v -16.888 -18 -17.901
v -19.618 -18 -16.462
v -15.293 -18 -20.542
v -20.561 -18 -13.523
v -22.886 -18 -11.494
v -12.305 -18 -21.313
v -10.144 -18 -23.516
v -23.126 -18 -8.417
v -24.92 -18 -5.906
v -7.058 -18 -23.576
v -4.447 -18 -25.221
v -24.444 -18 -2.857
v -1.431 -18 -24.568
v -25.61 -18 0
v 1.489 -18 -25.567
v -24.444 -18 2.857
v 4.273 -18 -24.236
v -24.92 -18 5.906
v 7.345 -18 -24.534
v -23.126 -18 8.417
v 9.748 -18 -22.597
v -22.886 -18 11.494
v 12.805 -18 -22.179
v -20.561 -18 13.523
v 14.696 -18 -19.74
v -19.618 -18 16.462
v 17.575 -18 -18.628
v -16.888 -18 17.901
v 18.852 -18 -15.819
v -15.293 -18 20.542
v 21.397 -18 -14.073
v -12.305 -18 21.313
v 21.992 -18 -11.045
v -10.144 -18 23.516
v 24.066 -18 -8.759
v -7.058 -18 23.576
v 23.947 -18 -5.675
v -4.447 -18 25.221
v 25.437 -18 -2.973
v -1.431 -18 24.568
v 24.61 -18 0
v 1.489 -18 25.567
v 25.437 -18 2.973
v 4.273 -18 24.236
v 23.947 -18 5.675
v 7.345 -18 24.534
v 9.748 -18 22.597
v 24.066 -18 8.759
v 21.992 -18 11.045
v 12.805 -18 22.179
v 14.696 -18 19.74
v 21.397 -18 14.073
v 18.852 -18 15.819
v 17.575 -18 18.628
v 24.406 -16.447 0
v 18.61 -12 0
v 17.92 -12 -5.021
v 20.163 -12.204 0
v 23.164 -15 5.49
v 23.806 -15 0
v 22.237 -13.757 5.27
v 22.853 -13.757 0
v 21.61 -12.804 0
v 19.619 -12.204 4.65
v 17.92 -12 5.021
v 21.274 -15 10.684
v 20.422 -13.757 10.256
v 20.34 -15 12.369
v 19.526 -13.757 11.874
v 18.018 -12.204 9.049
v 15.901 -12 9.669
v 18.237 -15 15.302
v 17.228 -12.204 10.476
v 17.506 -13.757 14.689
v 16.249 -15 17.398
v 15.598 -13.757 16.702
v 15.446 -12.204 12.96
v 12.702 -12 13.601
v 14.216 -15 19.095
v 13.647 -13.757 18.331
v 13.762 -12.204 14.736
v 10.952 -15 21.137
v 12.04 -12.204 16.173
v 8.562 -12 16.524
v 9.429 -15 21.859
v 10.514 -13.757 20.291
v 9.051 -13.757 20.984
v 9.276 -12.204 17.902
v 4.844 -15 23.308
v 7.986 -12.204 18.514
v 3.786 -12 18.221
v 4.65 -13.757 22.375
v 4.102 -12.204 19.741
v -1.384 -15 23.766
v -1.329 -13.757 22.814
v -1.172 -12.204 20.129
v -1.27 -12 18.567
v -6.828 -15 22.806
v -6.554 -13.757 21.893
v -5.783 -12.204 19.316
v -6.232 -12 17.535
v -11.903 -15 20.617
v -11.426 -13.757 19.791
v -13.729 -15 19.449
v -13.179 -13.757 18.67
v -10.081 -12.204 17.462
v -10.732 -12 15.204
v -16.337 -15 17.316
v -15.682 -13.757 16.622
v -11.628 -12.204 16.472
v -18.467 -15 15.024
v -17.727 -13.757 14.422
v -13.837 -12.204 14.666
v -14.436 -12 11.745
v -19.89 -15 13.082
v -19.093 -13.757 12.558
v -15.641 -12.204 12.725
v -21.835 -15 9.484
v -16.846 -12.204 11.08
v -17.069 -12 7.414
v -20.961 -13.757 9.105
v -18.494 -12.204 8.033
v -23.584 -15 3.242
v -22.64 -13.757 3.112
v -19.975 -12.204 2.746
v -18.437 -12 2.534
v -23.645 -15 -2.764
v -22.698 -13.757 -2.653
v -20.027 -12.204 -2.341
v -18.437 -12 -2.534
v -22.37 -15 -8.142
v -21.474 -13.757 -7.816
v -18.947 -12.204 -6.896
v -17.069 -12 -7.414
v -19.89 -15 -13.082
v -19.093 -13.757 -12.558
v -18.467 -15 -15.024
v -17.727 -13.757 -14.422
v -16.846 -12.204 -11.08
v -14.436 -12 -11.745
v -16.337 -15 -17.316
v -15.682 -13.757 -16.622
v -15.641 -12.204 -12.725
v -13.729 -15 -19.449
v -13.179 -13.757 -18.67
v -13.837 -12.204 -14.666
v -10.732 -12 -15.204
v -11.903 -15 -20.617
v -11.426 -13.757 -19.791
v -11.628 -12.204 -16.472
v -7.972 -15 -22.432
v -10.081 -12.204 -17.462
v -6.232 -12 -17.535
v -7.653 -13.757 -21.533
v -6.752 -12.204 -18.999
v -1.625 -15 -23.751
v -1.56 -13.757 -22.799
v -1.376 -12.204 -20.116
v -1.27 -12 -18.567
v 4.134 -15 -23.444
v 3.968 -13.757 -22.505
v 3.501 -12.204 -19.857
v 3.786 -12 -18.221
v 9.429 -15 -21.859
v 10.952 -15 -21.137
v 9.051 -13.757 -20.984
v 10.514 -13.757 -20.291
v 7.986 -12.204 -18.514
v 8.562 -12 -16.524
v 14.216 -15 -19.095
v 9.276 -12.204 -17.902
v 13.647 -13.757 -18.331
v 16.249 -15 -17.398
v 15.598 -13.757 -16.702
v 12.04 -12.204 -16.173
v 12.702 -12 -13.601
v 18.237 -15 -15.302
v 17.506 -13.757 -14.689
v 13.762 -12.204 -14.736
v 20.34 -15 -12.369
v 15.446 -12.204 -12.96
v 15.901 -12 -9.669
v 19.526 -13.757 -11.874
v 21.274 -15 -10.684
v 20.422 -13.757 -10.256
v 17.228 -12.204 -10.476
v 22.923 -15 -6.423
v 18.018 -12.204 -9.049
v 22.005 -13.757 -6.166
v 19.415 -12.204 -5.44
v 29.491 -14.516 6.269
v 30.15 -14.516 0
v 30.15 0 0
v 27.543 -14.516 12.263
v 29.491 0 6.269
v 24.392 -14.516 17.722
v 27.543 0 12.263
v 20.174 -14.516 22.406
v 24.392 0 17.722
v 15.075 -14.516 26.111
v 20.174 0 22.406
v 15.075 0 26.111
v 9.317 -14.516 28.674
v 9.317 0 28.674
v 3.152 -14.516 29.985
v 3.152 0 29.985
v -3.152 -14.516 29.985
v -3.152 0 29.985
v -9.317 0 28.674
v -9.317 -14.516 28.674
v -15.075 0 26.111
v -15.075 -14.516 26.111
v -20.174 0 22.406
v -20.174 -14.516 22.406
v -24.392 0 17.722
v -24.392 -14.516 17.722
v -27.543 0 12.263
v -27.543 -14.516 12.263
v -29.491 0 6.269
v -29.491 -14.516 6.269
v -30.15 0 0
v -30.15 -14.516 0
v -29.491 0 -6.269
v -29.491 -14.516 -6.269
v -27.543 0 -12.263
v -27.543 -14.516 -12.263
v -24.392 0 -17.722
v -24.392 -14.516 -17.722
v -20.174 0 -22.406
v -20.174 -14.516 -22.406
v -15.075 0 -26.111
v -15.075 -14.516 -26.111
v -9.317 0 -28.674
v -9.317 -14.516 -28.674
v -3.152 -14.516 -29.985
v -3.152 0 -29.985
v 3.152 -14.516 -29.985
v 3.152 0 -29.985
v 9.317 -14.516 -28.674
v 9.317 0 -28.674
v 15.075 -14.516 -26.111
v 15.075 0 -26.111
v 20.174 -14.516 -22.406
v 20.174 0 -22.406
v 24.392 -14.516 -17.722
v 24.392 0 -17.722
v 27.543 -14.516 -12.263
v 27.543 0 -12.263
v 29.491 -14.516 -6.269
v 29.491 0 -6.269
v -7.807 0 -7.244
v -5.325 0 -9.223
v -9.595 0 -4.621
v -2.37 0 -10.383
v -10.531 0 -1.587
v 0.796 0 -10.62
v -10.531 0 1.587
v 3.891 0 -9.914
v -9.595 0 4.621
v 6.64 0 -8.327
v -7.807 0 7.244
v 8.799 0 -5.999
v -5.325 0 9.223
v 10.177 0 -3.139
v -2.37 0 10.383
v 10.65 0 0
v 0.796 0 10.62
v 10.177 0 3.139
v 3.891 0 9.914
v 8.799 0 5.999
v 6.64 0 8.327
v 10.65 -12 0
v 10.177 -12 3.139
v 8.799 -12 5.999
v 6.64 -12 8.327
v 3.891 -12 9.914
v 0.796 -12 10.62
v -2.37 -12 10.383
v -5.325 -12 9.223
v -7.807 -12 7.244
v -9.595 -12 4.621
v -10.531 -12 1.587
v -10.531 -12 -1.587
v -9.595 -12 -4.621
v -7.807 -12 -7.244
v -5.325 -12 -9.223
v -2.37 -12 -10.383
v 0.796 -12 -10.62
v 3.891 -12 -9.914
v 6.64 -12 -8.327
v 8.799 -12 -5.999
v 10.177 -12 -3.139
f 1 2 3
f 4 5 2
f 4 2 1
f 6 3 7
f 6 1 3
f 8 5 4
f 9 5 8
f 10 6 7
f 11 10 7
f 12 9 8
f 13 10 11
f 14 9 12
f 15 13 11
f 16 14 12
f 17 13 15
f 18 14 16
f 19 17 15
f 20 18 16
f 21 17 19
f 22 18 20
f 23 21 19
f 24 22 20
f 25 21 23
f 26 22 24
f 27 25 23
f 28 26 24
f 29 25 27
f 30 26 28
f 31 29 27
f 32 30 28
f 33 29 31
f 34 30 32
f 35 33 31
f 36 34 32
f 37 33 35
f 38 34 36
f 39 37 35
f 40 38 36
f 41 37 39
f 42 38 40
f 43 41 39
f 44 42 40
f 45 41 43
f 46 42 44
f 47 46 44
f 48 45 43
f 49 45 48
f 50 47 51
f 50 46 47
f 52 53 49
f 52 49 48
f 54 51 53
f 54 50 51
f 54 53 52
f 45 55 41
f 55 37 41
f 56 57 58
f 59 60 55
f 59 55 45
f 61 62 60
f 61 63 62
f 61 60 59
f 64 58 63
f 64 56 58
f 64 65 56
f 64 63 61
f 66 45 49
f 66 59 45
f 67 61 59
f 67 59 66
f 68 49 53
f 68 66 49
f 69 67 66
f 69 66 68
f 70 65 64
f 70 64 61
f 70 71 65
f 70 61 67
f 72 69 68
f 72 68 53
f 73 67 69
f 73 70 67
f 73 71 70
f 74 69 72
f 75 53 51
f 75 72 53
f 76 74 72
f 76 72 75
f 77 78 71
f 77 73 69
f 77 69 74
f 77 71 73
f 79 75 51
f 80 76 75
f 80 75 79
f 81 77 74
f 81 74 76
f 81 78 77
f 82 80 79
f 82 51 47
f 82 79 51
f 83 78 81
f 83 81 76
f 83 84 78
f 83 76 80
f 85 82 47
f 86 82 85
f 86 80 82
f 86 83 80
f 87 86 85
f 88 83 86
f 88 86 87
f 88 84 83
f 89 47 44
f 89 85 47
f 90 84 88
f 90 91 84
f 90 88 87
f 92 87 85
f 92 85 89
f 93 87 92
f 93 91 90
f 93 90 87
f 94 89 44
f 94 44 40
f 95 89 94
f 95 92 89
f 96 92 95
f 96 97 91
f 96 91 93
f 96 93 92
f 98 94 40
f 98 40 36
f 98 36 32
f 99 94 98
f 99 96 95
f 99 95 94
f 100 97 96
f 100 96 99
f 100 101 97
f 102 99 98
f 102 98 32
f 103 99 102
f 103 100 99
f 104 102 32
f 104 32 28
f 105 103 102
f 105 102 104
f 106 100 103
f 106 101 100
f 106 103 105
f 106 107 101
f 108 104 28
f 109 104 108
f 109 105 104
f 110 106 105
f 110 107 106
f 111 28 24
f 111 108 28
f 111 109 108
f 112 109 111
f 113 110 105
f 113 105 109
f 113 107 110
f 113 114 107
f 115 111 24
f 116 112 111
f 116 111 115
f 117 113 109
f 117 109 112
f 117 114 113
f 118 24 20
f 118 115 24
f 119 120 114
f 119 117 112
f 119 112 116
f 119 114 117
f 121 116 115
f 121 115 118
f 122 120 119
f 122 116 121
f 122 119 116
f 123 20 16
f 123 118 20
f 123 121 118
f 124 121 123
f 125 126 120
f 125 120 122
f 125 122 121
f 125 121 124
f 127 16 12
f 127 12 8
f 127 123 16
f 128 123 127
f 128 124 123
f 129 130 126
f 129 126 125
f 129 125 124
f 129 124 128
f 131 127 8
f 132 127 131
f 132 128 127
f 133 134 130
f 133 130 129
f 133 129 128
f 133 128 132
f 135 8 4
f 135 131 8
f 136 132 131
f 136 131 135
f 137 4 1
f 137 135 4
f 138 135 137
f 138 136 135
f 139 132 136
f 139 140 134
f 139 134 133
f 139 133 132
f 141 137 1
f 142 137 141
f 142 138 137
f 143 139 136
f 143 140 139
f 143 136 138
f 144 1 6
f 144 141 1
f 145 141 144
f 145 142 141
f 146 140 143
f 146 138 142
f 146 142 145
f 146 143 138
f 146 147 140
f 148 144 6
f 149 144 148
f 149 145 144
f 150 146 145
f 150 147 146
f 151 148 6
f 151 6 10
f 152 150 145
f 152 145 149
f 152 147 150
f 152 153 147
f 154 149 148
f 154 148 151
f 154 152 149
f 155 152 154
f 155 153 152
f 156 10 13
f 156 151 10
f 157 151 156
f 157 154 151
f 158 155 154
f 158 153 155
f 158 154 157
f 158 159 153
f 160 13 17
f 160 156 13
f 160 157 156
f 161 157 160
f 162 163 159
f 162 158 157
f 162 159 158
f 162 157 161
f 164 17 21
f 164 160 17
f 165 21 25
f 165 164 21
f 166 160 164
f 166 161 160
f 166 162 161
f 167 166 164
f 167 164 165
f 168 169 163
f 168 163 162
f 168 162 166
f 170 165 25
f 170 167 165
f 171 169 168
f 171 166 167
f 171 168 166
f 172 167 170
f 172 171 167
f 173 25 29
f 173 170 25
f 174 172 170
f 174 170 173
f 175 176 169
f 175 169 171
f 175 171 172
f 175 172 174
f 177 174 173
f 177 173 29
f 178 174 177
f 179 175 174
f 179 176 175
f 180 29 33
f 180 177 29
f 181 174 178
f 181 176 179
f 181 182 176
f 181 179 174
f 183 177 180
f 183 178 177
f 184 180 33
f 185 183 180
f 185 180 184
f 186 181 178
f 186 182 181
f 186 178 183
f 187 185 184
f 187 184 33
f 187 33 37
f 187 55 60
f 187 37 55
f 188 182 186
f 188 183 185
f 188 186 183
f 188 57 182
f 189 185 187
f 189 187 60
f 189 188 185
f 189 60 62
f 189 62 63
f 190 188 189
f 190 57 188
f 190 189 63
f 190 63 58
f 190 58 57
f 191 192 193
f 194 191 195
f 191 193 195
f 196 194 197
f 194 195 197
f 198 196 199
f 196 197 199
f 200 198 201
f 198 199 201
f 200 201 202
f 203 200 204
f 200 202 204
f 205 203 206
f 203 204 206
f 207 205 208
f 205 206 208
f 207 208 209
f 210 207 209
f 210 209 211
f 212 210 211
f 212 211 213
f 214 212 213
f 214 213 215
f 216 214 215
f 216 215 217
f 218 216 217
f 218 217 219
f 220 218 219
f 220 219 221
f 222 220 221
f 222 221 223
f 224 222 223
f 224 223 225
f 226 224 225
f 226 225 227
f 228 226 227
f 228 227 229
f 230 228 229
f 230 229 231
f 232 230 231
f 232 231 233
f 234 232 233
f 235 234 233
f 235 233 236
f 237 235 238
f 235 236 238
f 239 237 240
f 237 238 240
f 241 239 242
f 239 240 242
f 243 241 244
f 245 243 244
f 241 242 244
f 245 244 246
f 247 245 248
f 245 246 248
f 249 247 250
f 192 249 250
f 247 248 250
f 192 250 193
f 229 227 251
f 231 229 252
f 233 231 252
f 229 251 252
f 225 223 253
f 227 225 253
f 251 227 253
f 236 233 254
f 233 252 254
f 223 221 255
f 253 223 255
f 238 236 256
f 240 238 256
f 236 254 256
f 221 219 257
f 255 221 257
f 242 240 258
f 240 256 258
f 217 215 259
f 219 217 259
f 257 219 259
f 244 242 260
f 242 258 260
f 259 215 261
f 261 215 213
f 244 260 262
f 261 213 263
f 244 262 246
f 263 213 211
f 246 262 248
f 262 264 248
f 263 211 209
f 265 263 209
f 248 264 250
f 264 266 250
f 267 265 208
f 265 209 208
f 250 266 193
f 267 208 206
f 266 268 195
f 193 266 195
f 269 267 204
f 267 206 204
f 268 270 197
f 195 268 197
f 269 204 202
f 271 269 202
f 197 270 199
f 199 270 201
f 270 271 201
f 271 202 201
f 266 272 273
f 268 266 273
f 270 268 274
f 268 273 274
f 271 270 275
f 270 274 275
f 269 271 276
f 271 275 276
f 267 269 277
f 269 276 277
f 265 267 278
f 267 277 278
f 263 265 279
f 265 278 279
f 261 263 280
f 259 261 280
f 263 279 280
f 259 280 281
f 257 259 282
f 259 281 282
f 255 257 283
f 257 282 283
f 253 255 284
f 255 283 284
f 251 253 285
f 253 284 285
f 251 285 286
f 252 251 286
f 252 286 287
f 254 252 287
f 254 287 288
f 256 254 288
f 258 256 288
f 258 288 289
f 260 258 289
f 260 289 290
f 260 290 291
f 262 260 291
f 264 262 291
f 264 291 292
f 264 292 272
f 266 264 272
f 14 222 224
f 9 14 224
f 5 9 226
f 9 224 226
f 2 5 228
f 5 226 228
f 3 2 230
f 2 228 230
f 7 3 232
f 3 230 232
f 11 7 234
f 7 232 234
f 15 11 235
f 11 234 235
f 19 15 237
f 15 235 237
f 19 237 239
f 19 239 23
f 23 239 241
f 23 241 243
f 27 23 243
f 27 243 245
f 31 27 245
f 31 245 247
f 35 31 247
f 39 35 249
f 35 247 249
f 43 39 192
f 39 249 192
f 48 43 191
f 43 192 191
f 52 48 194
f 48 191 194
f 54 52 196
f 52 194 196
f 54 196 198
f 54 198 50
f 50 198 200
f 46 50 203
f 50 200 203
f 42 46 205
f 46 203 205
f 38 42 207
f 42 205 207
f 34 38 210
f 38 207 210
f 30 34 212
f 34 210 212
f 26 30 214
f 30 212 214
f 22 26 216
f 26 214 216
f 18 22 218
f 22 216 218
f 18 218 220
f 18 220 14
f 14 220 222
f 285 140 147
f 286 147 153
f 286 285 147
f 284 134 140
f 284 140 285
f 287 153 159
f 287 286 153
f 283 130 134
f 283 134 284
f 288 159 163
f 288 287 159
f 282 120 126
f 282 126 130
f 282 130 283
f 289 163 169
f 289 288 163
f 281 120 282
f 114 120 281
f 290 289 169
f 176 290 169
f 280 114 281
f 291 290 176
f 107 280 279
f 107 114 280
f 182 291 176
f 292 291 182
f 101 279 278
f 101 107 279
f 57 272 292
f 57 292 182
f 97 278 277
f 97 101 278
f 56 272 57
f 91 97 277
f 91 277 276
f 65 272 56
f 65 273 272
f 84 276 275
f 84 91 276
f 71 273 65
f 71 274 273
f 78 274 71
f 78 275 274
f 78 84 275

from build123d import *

# Parameters (mm, degrees)
F0_R     = 30.15
F1_DEPTH = 18
F3_R     = 24.61
F4_DEPTH = 6
F5_R     = 5.99999
F6_R     = 10.65
F7_DEPTH = 25


# Not quite as in the source:
# - a fillet or chamfer is up to 0.001 mm smaller than in the source, because OpenCascade refuses the exact size


with BuildPart() as f1:
    # F0 (on Front) → F1 (new body)
    with BuildSketch(Plane.XZ):
        Circle(F0_R)
    extrude(amount=F1_DEPTH)

    # F3 (on face) → F4 (cut)
    with BuildSketch(Plane.XZ.offset(18)):
        Circle(F3_R)
    extrude(amount=-F4_DEPTH, mode=Mode.SUBTRACT)

    # F5 (radius 6 in the source; OpenCascade refuses exactly that, so slightly less here)
    f5_edges = [f1.edges().sort_by_distance(p)[0] for p in [
        (-24.61, -12, 0),
    ]]
    fillet(f5_edges, radius=F5_R)

    # F6 (on face) → F7 (cut)
    with BuildSketch(Plane.XZ.offset(18)):
        Circle(F6_R)
    extrude(amount=-F7_DEPTH, mode=Mode.SUBTRACT)

    # F8 (on Top) → F9 (revolve, cut)
    with BuildSketch(Plane.XY):
        Polygon((-30.15, -18.1521177292), (-25.61, -18), (-30.15, -14.5163354746), align=None)
    revolve(axis=Axis((0, -3.379675094, 0), (0, -1, 0)), mode=Mode.SUBTRACT)


solid = f1.part
